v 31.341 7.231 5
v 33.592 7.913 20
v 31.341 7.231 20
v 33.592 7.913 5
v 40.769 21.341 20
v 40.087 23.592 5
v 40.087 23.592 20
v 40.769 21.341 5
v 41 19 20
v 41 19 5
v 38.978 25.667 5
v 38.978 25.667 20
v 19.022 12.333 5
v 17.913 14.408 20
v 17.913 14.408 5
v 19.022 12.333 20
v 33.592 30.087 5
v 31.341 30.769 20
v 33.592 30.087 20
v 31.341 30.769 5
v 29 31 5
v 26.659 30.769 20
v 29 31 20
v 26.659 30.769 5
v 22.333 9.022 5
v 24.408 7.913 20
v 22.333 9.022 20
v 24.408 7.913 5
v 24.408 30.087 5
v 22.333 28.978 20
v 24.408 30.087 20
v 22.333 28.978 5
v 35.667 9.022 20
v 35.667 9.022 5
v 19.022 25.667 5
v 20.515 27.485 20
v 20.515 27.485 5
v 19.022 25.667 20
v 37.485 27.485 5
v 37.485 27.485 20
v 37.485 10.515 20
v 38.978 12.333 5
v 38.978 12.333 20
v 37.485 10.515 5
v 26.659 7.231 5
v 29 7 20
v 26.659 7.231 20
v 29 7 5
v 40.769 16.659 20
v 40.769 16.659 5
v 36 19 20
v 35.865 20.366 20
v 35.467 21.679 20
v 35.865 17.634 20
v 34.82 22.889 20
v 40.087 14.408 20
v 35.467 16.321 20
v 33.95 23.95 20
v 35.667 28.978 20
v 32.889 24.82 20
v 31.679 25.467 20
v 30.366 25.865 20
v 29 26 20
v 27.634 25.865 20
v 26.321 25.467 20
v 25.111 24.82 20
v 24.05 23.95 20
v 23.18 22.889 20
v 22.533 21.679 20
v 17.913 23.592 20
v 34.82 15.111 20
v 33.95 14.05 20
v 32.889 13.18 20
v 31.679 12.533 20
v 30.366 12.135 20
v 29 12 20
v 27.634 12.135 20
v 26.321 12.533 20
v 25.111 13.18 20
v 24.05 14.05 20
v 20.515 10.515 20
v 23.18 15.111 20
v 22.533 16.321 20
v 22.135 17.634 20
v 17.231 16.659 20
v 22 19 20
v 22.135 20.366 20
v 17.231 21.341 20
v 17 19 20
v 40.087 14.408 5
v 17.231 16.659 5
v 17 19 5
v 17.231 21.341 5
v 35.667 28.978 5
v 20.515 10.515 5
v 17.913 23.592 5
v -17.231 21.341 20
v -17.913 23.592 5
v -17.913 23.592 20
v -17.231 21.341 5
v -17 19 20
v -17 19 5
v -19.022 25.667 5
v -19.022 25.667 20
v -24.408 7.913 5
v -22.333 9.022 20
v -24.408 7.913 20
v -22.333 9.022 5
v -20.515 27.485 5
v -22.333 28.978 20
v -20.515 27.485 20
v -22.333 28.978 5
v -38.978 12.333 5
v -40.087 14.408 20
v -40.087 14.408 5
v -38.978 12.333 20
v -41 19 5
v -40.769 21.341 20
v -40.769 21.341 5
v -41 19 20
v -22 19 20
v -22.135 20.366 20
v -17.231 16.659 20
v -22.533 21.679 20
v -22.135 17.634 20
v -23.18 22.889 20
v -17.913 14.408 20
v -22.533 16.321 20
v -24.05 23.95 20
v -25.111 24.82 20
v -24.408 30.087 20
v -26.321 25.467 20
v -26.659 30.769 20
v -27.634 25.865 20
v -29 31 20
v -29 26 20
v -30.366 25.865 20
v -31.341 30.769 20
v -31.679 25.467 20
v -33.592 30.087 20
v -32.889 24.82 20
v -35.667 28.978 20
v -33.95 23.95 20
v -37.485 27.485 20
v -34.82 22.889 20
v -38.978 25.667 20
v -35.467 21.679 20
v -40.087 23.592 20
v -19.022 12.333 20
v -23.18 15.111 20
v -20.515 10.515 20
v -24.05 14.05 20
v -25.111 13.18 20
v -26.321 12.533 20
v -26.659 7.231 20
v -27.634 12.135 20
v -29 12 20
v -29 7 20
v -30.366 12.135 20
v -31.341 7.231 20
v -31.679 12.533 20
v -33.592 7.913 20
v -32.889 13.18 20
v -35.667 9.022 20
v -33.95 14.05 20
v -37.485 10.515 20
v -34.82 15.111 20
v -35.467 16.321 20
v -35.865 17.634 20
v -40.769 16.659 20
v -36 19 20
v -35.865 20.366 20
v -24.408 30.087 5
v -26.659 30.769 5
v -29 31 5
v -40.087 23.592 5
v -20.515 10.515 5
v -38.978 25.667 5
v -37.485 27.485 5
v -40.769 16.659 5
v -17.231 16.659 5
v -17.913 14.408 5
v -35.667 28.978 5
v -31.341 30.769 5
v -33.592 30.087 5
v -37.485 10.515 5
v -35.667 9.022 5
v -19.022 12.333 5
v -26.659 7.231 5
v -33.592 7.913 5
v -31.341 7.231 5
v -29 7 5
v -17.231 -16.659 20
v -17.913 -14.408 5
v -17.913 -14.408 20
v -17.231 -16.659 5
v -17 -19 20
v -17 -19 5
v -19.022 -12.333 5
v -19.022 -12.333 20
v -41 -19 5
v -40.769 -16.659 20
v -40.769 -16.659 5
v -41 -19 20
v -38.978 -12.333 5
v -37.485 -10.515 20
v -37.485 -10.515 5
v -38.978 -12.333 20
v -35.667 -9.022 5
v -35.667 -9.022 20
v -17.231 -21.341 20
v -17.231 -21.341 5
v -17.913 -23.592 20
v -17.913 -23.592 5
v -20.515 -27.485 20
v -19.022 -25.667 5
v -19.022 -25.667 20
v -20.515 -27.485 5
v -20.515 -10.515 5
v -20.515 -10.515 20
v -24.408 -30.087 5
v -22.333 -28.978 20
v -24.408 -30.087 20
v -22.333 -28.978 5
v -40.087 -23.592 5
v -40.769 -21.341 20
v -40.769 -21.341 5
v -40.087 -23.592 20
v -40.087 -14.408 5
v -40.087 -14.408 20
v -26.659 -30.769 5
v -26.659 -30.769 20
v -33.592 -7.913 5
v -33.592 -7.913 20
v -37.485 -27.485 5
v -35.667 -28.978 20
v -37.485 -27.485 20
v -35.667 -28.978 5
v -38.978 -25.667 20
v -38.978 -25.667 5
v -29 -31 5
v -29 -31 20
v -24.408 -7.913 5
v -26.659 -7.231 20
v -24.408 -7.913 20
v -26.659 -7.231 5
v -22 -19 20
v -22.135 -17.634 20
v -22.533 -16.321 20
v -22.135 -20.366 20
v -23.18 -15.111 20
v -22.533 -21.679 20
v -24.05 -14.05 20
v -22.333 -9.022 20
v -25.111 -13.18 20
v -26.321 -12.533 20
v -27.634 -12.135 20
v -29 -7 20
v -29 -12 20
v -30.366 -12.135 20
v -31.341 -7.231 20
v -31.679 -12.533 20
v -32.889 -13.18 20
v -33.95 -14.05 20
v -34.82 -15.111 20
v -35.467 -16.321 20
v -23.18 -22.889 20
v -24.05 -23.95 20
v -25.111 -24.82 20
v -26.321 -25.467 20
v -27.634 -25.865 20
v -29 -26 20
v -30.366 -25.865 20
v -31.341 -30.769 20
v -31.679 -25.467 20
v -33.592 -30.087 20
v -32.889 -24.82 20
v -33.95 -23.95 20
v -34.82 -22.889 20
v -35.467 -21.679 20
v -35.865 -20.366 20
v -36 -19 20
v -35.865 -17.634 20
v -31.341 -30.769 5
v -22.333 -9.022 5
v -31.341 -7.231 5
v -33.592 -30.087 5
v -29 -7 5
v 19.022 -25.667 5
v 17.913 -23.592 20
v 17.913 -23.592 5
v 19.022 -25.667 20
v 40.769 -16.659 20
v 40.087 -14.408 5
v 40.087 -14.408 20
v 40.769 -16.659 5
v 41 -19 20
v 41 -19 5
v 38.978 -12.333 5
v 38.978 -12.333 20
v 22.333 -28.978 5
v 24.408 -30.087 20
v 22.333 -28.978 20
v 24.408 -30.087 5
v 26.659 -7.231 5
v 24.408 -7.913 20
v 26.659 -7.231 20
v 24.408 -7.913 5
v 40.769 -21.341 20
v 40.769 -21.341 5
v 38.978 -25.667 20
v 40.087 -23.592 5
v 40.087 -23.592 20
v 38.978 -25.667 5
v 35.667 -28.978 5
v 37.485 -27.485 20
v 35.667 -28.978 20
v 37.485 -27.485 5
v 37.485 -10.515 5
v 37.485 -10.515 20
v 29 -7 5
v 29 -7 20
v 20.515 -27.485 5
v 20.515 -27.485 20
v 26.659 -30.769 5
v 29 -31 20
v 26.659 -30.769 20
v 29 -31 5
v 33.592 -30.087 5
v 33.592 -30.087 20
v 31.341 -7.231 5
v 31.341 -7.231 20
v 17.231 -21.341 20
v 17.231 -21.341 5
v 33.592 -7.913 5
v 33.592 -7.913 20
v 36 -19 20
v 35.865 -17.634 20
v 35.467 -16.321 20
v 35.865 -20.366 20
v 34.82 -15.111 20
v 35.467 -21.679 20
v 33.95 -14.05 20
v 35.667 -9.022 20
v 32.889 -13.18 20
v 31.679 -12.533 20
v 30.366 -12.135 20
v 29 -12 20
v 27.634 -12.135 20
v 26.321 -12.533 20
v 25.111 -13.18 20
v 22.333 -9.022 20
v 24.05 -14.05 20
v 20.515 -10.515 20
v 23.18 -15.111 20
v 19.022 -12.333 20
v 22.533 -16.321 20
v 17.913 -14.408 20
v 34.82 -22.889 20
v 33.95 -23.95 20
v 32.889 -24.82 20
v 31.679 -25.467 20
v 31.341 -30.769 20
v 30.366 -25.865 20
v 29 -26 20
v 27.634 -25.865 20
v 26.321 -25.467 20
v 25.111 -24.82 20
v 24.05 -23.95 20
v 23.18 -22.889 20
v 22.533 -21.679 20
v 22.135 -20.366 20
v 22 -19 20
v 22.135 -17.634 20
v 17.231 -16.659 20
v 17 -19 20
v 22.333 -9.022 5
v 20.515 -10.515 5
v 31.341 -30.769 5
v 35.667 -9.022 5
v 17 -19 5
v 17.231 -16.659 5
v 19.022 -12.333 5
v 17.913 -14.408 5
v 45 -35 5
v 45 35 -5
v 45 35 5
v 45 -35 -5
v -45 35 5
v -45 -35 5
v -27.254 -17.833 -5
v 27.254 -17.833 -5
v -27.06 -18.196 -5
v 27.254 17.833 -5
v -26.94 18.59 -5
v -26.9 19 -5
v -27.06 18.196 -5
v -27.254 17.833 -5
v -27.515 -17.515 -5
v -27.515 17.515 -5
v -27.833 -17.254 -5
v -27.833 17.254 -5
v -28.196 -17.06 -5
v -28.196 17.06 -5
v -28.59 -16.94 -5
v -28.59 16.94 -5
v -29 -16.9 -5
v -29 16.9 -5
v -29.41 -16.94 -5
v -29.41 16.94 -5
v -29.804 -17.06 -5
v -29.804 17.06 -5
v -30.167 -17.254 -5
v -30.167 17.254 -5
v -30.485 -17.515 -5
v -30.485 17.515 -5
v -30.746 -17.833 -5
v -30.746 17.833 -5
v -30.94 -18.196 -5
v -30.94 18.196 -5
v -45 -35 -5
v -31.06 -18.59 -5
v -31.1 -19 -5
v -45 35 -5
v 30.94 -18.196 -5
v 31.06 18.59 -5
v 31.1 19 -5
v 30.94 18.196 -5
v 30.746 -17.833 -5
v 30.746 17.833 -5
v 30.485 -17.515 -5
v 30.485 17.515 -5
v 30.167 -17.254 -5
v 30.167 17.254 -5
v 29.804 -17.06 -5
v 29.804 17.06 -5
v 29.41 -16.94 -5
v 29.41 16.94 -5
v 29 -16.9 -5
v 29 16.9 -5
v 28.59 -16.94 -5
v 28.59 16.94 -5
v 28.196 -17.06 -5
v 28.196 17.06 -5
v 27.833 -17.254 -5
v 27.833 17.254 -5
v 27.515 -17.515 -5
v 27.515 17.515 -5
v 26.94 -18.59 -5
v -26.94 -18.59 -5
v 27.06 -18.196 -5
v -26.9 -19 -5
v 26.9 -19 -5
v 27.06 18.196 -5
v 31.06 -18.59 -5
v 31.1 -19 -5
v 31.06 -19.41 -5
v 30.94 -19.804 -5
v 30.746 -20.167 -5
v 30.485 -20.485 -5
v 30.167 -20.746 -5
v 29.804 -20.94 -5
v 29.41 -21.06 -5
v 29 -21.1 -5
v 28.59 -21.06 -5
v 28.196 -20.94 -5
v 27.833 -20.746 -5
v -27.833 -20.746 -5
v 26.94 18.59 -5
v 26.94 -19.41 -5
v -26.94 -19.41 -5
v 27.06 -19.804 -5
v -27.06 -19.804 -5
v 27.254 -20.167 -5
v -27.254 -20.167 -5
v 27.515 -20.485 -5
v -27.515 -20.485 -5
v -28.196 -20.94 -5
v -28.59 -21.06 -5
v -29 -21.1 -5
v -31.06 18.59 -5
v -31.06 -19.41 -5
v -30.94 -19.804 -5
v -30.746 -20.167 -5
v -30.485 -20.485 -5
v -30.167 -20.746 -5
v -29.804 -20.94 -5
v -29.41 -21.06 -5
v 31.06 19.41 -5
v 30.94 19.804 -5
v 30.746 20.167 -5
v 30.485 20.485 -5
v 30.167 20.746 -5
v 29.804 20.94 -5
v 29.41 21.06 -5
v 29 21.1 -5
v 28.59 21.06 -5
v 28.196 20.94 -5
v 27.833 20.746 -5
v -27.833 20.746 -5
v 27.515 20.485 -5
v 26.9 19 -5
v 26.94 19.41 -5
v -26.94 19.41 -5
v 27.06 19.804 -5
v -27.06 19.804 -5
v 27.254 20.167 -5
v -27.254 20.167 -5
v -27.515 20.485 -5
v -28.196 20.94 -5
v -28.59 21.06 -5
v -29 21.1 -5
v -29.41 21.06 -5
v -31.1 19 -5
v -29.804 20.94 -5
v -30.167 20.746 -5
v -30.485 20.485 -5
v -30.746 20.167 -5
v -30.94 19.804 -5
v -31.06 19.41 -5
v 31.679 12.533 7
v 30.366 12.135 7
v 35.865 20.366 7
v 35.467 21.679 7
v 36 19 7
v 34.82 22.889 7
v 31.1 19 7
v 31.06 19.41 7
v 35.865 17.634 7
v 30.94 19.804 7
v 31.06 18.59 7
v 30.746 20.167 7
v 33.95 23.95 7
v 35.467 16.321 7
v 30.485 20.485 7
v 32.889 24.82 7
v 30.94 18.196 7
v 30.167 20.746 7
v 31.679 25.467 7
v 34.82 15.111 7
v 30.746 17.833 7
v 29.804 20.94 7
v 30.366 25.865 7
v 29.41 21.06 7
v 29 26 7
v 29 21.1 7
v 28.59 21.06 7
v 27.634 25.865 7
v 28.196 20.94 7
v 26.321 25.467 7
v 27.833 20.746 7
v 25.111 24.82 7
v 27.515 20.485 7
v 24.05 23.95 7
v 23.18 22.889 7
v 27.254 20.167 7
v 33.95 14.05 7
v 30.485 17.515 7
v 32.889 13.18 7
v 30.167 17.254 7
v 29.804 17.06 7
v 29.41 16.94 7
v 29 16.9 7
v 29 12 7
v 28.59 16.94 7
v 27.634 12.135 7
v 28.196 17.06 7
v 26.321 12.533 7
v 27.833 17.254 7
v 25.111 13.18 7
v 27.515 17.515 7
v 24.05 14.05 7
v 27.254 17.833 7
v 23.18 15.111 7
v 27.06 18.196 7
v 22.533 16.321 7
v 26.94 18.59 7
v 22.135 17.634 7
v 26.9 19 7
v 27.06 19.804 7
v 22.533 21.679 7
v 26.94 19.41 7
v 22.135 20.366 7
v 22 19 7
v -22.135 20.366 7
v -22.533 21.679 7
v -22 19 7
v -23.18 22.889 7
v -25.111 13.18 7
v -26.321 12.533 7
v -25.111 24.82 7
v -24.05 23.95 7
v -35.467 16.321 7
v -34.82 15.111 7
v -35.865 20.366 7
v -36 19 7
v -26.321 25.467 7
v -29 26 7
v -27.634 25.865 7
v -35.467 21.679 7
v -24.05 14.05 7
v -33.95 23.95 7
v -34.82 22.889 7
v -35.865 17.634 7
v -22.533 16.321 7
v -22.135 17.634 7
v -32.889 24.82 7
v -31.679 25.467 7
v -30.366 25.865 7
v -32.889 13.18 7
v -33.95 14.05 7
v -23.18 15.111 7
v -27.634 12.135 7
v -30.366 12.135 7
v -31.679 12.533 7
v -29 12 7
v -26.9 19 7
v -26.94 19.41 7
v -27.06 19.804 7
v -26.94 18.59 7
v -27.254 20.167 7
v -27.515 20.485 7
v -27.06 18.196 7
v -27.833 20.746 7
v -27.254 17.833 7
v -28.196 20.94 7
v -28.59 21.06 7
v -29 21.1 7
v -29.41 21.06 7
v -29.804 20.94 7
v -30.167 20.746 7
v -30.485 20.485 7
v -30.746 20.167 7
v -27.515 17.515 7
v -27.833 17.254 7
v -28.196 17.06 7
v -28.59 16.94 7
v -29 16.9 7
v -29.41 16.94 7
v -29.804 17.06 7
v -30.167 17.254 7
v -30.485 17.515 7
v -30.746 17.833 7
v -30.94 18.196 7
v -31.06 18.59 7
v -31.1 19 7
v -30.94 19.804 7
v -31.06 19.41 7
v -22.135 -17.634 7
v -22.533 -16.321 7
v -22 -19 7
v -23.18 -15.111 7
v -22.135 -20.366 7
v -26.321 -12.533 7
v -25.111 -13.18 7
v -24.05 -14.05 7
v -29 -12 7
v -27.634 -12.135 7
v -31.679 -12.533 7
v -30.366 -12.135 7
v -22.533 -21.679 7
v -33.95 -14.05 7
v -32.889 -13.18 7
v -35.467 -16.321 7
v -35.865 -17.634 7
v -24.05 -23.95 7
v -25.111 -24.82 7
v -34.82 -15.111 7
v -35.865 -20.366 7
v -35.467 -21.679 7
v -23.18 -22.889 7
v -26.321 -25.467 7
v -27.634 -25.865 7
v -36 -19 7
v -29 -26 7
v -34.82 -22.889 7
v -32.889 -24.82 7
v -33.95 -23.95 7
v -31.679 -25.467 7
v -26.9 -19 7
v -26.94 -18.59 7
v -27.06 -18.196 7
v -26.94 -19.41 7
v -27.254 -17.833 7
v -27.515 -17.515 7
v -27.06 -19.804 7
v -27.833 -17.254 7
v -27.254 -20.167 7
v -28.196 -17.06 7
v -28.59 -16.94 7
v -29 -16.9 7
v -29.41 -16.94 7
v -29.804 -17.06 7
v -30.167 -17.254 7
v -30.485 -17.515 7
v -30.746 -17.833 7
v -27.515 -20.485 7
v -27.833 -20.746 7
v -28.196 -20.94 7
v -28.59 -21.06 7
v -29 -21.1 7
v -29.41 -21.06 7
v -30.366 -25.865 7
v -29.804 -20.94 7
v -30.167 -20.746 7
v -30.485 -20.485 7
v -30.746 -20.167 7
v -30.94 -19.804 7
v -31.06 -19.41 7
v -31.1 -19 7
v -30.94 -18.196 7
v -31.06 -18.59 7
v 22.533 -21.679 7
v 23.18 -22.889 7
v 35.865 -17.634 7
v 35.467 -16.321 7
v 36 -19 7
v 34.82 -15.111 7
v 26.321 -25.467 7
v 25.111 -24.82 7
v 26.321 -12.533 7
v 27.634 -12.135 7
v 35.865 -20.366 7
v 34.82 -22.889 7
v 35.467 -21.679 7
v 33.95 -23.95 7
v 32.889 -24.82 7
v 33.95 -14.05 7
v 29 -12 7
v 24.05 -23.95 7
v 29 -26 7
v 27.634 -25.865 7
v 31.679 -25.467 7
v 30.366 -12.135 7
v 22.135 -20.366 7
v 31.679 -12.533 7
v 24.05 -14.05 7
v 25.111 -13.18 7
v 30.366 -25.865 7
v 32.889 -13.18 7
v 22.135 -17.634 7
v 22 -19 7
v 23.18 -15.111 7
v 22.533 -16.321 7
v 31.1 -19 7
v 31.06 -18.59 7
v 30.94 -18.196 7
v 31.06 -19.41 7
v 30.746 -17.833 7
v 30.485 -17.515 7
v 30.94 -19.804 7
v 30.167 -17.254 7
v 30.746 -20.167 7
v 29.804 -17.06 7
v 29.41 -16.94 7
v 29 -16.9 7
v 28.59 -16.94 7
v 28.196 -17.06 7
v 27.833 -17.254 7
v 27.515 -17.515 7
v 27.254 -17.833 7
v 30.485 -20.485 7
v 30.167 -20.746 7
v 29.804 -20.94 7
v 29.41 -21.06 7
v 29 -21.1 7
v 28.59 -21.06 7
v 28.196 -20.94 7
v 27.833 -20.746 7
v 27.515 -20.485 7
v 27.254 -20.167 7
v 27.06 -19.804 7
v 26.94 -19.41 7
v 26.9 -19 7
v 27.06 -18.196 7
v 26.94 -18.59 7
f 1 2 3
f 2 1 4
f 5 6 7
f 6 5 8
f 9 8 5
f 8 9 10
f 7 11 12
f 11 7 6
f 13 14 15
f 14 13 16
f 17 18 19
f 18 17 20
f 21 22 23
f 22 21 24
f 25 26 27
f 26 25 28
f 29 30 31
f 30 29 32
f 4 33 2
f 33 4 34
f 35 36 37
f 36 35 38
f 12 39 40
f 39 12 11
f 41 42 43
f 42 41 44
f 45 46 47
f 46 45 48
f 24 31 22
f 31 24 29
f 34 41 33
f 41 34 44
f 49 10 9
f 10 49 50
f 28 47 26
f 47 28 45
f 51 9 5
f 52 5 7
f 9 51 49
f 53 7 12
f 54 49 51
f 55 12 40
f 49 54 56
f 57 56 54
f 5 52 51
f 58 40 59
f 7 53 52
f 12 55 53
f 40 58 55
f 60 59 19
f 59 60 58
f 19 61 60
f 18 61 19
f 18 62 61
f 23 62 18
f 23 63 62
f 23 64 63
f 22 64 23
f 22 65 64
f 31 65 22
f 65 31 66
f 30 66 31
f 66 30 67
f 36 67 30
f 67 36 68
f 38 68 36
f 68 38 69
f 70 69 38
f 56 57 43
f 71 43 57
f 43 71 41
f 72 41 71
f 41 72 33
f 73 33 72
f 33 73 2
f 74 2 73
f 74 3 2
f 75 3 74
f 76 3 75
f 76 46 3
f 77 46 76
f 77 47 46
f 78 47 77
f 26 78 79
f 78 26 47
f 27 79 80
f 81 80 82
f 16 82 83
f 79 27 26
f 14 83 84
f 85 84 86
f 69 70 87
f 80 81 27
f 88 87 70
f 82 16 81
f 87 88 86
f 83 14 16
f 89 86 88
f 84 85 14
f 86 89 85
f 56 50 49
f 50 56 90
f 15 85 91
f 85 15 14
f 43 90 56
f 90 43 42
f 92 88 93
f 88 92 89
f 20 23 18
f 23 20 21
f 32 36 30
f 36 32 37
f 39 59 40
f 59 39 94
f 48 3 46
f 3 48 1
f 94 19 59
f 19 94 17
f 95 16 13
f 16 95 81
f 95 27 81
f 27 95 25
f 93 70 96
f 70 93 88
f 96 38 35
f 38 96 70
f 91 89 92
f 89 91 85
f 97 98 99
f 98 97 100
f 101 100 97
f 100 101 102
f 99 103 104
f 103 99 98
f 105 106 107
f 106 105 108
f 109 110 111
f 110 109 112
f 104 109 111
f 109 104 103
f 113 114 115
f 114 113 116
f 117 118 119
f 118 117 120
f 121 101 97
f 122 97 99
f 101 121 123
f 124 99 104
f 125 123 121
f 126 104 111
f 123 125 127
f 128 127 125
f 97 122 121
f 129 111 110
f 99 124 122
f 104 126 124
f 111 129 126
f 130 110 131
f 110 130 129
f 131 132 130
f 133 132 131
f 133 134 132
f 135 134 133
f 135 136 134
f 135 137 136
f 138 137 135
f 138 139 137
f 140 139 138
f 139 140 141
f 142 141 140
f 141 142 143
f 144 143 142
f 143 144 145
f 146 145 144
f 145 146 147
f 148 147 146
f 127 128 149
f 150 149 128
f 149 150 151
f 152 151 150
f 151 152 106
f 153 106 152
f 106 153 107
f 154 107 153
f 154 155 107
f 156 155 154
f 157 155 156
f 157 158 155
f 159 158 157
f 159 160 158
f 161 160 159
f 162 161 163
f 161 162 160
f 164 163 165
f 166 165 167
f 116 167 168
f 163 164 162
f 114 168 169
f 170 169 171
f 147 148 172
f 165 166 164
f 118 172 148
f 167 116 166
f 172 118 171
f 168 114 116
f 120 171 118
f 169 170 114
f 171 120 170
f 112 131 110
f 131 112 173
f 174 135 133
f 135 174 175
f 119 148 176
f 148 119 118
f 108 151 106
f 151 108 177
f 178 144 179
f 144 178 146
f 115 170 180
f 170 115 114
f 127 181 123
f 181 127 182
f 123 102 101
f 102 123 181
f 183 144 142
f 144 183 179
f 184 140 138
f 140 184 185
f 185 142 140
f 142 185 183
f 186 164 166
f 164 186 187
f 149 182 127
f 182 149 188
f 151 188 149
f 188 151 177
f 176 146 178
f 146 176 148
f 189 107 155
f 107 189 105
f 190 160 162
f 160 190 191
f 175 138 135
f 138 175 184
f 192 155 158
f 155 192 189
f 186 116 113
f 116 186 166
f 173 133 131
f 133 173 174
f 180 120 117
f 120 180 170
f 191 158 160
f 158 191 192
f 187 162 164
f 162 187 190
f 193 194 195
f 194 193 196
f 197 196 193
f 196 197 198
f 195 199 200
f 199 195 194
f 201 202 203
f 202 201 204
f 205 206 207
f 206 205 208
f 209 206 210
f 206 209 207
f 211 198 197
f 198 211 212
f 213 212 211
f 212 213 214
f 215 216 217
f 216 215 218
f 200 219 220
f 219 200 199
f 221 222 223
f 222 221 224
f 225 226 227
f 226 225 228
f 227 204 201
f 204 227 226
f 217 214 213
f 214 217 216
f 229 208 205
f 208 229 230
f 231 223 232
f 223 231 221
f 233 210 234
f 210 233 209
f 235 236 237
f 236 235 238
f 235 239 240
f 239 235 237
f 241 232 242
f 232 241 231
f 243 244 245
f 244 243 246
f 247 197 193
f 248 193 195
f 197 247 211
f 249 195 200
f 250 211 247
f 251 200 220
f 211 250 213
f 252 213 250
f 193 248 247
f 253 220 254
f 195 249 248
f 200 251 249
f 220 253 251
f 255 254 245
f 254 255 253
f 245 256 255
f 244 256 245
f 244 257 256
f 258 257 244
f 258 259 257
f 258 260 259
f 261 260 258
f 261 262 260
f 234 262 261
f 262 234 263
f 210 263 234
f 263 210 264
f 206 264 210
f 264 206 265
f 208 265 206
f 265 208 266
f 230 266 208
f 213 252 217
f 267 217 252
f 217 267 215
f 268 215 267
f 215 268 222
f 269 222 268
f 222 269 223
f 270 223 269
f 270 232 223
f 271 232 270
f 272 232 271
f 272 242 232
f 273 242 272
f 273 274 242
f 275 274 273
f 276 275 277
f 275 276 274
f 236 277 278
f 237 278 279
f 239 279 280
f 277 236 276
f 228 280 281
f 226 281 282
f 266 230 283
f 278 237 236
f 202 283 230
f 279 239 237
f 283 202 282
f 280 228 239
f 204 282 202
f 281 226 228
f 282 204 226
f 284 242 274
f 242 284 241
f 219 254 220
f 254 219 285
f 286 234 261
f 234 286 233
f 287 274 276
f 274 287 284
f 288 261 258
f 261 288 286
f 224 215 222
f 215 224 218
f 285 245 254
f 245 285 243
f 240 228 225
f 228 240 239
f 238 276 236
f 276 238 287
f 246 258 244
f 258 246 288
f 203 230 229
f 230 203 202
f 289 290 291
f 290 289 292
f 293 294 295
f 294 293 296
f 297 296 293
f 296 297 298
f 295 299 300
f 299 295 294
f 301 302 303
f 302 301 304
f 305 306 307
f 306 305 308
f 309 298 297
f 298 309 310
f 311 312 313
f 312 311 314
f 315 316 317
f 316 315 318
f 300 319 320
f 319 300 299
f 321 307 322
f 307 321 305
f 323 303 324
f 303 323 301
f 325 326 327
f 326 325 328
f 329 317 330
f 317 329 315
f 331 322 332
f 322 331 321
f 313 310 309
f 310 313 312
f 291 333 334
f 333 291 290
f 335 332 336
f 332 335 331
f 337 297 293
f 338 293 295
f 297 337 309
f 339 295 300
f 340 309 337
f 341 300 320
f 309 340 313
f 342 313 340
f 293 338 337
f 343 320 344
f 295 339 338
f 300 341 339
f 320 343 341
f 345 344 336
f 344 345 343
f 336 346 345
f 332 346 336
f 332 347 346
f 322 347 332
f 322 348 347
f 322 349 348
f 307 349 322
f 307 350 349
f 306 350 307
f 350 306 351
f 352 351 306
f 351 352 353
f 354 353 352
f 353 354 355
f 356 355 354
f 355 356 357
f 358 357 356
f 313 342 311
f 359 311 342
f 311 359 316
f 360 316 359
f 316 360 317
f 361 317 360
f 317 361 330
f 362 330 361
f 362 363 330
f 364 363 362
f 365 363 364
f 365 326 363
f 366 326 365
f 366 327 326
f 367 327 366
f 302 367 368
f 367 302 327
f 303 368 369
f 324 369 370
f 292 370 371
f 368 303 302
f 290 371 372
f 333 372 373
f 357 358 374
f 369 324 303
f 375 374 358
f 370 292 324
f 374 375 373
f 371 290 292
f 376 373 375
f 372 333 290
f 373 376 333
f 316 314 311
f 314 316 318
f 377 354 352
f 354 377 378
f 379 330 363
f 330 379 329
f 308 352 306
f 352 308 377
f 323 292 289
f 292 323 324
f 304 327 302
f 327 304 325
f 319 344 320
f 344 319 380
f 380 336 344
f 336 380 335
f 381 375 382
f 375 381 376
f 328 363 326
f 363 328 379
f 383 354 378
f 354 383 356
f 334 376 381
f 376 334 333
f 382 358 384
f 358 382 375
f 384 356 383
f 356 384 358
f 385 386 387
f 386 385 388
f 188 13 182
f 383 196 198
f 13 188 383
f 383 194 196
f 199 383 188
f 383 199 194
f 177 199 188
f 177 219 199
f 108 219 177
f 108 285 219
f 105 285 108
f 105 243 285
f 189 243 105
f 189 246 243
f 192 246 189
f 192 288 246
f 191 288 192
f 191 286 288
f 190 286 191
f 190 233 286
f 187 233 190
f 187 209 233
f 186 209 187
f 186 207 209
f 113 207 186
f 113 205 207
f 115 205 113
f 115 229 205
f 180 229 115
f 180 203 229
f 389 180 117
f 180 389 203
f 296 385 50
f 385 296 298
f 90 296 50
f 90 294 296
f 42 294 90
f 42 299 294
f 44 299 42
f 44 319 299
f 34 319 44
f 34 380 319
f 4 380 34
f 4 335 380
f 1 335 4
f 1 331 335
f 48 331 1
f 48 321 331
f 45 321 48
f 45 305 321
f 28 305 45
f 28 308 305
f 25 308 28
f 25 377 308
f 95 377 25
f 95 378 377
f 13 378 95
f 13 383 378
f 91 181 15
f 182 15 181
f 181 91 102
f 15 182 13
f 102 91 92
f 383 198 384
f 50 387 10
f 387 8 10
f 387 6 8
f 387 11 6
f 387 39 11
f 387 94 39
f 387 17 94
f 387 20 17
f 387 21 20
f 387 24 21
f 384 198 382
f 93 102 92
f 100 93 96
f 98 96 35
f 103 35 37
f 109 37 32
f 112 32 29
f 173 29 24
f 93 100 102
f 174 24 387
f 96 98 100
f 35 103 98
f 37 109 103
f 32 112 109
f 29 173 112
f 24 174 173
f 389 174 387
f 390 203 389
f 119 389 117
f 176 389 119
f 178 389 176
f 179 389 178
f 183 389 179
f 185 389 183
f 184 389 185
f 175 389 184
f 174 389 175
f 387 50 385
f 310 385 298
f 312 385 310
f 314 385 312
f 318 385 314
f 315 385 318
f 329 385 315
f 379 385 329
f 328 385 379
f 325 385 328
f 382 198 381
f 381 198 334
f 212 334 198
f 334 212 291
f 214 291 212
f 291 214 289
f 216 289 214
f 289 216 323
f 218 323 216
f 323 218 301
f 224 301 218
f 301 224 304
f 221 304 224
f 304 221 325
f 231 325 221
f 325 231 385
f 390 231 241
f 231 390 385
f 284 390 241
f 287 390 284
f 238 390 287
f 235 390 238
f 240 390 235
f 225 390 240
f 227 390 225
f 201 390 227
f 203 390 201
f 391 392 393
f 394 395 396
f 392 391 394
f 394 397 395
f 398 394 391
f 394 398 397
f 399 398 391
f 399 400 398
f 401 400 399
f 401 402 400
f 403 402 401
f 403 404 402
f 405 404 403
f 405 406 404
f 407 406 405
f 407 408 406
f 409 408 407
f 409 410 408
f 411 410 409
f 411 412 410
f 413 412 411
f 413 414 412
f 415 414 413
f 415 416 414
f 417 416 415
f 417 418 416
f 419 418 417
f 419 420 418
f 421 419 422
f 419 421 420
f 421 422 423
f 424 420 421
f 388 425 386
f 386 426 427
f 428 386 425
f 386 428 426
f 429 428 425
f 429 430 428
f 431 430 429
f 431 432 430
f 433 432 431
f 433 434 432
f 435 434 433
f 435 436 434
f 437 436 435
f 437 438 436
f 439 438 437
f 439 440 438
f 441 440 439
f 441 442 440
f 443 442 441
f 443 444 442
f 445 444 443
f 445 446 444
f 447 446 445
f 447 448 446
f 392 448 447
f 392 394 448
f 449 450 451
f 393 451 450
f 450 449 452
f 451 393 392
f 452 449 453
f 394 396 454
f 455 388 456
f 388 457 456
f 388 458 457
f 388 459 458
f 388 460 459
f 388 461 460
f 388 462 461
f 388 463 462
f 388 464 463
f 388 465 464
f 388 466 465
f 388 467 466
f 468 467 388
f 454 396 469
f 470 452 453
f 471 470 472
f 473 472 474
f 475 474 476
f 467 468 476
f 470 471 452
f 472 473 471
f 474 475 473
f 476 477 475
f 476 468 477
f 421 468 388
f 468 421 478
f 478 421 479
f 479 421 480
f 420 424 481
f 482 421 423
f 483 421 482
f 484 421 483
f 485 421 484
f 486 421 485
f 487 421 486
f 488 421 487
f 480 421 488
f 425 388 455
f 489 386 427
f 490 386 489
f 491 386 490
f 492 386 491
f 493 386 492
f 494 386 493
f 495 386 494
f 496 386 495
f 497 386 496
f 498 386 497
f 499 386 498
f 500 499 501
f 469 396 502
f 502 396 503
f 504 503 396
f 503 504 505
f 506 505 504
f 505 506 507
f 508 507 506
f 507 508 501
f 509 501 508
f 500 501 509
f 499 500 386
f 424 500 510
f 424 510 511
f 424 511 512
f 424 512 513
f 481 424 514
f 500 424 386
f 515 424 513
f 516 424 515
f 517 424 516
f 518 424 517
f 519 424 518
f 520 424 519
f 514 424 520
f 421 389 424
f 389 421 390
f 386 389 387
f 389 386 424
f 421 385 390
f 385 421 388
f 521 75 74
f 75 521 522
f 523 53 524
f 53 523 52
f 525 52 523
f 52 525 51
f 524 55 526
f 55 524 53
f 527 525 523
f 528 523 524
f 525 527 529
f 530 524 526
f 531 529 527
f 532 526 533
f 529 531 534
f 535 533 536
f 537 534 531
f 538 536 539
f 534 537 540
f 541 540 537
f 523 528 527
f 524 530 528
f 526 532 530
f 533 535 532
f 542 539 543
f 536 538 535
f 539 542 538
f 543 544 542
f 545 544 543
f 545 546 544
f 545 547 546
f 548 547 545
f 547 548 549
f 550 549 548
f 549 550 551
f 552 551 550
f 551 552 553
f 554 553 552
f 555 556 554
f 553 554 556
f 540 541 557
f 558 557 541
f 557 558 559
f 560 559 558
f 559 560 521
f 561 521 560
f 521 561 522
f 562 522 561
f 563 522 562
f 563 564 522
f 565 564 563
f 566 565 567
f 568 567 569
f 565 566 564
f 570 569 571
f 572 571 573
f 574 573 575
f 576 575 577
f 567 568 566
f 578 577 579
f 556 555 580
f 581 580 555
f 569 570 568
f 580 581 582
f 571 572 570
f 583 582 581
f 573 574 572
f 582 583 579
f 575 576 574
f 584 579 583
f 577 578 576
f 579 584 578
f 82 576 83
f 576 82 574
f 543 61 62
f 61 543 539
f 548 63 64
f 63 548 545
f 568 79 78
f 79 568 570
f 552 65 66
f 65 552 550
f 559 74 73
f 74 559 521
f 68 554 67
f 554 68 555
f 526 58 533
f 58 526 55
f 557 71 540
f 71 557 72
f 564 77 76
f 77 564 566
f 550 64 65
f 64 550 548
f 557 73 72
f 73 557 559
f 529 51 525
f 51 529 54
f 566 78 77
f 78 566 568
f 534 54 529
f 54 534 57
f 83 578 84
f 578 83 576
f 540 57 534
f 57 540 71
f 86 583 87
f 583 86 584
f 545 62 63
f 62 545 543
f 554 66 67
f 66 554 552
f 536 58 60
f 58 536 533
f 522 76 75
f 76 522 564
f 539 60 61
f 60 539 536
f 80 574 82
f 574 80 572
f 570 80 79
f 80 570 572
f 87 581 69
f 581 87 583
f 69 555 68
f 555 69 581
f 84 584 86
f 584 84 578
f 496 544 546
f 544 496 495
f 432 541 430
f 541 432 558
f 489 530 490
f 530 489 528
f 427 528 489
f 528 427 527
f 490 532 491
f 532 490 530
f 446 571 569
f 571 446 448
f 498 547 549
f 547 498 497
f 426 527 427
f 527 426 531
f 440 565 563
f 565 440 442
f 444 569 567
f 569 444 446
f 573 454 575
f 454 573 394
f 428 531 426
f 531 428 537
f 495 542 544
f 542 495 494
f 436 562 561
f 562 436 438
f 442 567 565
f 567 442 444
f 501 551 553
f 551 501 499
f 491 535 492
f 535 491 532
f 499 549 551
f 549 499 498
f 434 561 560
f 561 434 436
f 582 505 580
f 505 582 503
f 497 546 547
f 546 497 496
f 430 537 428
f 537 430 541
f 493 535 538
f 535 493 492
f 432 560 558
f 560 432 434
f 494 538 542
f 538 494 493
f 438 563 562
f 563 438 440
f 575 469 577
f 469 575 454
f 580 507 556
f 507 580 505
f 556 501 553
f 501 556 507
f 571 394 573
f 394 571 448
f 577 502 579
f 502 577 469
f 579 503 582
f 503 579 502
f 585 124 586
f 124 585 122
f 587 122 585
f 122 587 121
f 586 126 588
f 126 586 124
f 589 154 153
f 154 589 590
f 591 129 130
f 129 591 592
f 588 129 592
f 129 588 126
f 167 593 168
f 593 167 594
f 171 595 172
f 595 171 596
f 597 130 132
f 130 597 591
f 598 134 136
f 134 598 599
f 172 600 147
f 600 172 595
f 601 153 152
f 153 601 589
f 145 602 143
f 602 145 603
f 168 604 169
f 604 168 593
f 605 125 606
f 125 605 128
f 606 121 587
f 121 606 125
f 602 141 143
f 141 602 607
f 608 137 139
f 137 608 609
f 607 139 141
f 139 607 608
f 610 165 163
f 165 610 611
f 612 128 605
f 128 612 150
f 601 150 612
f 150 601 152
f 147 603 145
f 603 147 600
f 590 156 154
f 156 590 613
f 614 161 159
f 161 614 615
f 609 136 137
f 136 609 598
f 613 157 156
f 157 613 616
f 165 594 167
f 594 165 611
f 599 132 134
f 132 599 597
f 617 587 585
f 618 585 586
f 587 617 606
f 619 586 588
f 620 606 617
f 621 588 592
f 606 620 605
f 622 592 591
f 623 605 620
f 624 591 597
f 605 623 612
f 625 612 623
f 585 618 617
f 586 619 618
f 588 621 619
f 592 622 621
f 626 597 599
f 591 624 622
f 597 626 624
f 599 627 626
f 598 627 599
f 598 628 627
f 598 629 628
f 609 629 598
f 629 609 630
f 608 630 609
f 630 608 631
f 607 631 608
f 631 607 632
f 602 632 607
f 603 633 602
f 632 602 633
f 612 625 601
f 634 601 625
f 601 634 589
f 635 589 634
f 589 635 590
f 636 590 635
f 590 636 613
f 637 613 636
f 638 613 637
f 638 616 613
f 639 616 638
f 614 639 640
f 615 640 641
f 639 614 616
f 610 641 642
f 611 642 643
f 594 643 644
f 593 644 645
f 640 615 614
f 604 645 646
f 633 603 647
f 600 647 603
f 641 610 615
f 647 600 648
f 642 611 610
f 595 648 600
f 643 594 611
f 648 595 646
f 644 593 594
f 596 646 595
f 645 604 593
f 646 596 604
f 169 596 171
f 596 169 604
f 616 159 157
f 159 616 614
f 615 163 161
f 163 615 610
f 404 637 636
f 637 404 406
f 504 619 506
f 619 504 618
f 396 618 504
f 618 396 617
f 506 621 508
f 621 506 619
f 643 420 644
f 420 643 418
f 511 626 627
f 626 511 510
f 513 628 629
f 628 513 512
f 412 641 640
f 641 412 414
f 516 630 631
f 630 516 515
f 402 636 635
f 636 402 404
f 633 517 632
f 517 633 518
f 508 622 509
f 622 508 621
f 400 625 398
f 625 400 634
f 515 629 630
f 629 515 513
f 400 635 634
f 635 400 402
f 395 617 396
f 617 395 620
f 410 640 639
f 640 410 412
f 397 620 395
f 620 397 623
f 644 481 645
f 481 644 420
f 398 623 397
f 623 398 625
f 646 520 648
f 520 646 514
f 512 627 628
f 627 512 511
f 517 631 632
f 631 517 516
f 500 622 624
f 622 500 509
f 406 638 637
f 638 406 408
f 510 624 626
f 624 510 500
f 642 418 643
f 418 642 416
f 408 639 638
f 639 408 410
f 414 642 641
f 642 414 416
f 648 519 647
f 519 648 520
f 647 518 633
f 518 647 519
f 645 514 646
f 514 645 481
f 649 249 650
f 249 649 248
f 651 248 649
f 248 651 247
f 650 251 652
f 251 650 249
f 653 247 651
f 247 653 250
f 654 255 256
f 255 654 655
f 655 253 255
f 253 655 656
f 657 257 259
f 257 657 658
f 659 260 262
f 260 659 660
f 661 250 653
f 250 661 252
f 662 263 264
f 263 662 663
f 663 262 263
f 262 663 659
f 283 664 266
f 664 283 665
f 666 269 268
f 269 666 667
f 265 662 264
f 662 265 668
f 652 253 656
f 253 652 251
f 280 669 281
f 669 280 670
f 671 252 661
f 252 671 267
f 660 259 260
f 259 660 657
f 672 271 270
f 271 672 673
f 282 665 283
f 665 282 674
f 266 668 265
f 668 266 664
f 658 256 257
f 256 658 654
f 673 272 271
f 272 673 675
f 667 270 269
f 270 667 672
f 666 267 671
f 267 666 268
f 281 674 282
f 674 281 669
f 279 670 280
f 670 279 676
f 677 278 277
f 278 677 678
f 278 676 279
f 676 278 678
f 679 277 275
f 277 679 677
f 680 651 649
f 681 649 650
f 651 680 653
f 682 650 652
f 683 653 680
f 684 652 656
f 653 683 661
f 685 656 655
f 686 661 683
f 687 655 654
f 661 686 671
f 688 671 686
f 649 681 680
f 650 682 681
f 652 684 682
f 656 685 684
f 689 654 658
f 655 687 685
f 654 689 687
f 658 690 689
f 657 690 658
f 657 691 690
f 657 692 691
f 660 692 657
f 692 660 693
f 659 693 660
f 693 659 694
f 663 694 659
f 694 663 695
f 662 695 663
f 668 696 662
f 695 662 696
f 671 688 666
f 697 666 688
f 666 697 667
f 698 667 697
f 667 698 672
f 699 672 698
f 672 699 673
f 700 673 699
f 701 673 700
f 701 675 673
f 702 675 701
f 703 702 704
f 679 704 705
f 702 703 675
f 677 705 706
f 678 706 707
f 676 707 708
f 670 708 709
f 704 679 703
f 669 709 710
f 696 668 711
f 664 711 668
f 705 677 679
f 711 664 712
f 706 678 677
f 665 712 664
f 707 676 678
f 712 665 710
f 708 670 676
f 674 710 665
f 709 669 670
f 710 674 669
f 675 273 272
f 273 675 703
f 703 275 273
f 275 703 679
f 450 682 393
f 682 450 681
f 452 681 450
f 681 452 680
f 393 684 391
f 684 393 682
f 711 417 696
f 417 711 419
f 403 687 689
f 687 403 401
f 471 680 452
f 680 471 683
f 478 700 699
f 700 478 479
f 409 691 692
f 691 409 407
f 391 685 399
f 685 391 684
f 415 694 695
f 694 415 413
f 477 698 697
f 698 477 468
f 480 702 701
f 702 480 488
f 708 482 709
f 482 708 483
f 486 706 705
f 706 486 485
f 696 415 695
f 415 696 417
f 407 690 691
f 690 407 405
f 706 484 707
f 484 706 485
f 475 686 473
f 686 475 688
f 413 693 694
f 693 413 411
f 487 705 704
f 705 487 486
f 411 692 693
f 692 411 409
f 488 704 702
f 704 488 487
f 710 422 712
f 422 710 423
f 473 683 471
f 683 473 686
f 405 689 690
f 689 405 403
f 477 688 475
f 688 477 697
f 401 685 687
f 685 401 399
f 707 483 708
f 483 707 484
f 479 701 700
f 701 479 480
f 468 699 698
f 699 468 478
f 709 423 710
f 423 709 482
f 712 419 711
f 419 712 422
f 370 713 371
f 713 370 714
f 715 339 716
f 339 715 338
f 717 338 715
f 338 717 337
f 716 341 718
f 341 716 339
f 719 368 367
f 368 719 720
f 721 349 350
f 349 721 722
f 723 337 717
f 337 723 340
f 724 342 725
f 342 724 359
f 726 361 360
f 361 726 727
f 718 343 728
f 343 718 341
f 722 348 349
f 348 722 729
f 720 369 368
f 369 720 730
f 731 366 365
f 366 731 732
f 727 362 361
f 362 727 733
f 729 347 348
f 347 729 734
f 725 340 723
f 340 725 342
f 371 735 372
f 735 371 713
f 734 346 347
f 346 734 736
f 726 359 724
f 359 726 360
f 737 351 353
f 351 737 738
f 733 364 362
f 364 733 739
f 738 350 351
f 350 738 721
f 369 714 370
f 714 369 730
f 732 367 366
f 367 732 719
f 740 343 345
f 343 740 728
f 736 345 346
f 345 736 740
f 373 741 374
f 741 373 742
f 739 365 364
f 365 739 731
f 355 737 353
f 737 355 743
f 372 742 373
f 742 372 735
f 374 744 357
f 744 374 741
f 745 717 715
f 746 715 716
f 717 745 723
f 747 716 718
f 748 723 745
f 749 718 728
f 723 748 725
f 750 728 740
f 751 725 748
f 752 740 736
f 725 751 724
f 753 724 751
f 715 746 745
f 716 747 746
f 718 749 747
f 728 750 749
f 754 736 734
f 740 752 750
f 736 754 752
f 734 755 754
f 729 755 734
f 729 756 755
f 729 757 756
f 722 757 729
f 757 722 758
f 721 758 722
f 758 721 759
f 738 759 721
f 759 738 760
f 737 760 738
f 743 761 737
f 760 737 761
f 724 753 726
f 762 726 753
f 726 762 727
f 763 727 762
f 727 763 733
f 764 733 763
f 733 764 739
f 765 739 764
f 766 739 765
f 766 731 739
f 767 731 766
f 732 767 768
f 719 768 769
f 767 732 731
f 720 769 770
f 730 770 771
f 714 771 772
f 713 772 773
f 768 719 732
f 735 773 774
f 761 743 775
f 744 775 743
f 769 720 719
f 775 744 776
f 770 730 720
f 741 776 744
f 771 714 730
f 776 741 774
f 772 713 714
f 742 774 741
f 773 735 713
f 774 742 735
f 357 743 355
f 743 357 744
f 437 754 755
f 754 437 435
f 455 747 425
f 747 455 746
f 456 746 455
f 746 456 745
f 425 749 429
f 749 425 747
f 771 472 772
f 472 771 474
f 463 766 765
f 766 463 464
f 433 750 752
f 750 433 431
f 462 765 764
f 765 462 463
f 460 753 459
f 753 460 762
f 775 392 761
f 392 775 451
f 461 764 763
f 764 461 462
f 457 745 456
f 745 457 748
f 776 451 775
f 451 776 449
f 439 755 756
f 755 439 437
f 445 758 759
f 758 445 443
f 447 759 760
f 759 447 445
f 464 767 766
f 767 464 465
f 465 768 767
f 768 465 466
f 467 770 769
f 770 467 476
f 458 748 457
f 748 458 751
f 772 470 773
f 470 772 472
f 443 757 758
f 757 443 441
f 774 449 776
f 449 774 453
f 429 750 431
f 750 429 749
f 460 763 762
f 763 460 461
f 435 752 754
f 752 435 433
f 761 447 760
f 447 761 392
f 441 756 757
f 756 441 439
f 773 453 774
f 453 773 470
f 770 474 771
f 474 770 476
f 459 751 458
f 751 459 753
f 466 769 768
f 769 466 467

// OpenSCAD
$fn = 32;

// ----------------------------------------------------------------------
// Socket pad plate
// bosses with counterbored sockets for the screws
// ----------------------------------------------------------------------

// --- parameters (mm) ---
base_t = 10;           // base plate thickness
boss_h = 15;           // boss height above the base plate
boss_d = 24;           // boss diameter
socket_d = 14;         // socket diameter
socket_depth = 13;     // socket depth from the boss face
bolt_d = 4.2;          // screw clearance hole through the socket floor
plate = [90, 70, 10];  // overall size (x, y, z)
edge = 16;             // boss centre offset from the plate edge
pads = 4;              // boss count, one per corner

// --- derived feature positions (mm) ---
height = base_t + boss_h;        // = 25   overall height of the part
corner_x = plate[0] / 2 - edge;  // = 29   boss centre X
corner_y = plate[1] / 2 - edge;  // = 19   boss centre Y
feature_centers = [
  [corner_x, corner_y],
  [-corner_x, corner_y],
  [-corner_x, -corner_y],
  [corner_x, -corner_y]
];   // boss centres: sockets, holes and the pads themselves are placed from here

// base plate, bosses on feature_centers, socket + through hole in each
difference() {
  union() {
    cube(plate, center = true);
    for (centre = feature_centers)
      translate([centre[0], centre[1], plate[2] / 2 - 1])
        cylinder(d = boss_d, h = boss_h + 1);
  }
  for (centre = feature_centers) {
    translate([centre[0], centre[1], plate[2] / 2 + boss_h - socket_depth])
      cylinder(d = socket_d, h = socket_depth + 1);
    translate([centre[0], centre[1], -height])
      cylinder(d = bolt_d, h = 2 * height + 2);  // through the socket floor
  }
}
